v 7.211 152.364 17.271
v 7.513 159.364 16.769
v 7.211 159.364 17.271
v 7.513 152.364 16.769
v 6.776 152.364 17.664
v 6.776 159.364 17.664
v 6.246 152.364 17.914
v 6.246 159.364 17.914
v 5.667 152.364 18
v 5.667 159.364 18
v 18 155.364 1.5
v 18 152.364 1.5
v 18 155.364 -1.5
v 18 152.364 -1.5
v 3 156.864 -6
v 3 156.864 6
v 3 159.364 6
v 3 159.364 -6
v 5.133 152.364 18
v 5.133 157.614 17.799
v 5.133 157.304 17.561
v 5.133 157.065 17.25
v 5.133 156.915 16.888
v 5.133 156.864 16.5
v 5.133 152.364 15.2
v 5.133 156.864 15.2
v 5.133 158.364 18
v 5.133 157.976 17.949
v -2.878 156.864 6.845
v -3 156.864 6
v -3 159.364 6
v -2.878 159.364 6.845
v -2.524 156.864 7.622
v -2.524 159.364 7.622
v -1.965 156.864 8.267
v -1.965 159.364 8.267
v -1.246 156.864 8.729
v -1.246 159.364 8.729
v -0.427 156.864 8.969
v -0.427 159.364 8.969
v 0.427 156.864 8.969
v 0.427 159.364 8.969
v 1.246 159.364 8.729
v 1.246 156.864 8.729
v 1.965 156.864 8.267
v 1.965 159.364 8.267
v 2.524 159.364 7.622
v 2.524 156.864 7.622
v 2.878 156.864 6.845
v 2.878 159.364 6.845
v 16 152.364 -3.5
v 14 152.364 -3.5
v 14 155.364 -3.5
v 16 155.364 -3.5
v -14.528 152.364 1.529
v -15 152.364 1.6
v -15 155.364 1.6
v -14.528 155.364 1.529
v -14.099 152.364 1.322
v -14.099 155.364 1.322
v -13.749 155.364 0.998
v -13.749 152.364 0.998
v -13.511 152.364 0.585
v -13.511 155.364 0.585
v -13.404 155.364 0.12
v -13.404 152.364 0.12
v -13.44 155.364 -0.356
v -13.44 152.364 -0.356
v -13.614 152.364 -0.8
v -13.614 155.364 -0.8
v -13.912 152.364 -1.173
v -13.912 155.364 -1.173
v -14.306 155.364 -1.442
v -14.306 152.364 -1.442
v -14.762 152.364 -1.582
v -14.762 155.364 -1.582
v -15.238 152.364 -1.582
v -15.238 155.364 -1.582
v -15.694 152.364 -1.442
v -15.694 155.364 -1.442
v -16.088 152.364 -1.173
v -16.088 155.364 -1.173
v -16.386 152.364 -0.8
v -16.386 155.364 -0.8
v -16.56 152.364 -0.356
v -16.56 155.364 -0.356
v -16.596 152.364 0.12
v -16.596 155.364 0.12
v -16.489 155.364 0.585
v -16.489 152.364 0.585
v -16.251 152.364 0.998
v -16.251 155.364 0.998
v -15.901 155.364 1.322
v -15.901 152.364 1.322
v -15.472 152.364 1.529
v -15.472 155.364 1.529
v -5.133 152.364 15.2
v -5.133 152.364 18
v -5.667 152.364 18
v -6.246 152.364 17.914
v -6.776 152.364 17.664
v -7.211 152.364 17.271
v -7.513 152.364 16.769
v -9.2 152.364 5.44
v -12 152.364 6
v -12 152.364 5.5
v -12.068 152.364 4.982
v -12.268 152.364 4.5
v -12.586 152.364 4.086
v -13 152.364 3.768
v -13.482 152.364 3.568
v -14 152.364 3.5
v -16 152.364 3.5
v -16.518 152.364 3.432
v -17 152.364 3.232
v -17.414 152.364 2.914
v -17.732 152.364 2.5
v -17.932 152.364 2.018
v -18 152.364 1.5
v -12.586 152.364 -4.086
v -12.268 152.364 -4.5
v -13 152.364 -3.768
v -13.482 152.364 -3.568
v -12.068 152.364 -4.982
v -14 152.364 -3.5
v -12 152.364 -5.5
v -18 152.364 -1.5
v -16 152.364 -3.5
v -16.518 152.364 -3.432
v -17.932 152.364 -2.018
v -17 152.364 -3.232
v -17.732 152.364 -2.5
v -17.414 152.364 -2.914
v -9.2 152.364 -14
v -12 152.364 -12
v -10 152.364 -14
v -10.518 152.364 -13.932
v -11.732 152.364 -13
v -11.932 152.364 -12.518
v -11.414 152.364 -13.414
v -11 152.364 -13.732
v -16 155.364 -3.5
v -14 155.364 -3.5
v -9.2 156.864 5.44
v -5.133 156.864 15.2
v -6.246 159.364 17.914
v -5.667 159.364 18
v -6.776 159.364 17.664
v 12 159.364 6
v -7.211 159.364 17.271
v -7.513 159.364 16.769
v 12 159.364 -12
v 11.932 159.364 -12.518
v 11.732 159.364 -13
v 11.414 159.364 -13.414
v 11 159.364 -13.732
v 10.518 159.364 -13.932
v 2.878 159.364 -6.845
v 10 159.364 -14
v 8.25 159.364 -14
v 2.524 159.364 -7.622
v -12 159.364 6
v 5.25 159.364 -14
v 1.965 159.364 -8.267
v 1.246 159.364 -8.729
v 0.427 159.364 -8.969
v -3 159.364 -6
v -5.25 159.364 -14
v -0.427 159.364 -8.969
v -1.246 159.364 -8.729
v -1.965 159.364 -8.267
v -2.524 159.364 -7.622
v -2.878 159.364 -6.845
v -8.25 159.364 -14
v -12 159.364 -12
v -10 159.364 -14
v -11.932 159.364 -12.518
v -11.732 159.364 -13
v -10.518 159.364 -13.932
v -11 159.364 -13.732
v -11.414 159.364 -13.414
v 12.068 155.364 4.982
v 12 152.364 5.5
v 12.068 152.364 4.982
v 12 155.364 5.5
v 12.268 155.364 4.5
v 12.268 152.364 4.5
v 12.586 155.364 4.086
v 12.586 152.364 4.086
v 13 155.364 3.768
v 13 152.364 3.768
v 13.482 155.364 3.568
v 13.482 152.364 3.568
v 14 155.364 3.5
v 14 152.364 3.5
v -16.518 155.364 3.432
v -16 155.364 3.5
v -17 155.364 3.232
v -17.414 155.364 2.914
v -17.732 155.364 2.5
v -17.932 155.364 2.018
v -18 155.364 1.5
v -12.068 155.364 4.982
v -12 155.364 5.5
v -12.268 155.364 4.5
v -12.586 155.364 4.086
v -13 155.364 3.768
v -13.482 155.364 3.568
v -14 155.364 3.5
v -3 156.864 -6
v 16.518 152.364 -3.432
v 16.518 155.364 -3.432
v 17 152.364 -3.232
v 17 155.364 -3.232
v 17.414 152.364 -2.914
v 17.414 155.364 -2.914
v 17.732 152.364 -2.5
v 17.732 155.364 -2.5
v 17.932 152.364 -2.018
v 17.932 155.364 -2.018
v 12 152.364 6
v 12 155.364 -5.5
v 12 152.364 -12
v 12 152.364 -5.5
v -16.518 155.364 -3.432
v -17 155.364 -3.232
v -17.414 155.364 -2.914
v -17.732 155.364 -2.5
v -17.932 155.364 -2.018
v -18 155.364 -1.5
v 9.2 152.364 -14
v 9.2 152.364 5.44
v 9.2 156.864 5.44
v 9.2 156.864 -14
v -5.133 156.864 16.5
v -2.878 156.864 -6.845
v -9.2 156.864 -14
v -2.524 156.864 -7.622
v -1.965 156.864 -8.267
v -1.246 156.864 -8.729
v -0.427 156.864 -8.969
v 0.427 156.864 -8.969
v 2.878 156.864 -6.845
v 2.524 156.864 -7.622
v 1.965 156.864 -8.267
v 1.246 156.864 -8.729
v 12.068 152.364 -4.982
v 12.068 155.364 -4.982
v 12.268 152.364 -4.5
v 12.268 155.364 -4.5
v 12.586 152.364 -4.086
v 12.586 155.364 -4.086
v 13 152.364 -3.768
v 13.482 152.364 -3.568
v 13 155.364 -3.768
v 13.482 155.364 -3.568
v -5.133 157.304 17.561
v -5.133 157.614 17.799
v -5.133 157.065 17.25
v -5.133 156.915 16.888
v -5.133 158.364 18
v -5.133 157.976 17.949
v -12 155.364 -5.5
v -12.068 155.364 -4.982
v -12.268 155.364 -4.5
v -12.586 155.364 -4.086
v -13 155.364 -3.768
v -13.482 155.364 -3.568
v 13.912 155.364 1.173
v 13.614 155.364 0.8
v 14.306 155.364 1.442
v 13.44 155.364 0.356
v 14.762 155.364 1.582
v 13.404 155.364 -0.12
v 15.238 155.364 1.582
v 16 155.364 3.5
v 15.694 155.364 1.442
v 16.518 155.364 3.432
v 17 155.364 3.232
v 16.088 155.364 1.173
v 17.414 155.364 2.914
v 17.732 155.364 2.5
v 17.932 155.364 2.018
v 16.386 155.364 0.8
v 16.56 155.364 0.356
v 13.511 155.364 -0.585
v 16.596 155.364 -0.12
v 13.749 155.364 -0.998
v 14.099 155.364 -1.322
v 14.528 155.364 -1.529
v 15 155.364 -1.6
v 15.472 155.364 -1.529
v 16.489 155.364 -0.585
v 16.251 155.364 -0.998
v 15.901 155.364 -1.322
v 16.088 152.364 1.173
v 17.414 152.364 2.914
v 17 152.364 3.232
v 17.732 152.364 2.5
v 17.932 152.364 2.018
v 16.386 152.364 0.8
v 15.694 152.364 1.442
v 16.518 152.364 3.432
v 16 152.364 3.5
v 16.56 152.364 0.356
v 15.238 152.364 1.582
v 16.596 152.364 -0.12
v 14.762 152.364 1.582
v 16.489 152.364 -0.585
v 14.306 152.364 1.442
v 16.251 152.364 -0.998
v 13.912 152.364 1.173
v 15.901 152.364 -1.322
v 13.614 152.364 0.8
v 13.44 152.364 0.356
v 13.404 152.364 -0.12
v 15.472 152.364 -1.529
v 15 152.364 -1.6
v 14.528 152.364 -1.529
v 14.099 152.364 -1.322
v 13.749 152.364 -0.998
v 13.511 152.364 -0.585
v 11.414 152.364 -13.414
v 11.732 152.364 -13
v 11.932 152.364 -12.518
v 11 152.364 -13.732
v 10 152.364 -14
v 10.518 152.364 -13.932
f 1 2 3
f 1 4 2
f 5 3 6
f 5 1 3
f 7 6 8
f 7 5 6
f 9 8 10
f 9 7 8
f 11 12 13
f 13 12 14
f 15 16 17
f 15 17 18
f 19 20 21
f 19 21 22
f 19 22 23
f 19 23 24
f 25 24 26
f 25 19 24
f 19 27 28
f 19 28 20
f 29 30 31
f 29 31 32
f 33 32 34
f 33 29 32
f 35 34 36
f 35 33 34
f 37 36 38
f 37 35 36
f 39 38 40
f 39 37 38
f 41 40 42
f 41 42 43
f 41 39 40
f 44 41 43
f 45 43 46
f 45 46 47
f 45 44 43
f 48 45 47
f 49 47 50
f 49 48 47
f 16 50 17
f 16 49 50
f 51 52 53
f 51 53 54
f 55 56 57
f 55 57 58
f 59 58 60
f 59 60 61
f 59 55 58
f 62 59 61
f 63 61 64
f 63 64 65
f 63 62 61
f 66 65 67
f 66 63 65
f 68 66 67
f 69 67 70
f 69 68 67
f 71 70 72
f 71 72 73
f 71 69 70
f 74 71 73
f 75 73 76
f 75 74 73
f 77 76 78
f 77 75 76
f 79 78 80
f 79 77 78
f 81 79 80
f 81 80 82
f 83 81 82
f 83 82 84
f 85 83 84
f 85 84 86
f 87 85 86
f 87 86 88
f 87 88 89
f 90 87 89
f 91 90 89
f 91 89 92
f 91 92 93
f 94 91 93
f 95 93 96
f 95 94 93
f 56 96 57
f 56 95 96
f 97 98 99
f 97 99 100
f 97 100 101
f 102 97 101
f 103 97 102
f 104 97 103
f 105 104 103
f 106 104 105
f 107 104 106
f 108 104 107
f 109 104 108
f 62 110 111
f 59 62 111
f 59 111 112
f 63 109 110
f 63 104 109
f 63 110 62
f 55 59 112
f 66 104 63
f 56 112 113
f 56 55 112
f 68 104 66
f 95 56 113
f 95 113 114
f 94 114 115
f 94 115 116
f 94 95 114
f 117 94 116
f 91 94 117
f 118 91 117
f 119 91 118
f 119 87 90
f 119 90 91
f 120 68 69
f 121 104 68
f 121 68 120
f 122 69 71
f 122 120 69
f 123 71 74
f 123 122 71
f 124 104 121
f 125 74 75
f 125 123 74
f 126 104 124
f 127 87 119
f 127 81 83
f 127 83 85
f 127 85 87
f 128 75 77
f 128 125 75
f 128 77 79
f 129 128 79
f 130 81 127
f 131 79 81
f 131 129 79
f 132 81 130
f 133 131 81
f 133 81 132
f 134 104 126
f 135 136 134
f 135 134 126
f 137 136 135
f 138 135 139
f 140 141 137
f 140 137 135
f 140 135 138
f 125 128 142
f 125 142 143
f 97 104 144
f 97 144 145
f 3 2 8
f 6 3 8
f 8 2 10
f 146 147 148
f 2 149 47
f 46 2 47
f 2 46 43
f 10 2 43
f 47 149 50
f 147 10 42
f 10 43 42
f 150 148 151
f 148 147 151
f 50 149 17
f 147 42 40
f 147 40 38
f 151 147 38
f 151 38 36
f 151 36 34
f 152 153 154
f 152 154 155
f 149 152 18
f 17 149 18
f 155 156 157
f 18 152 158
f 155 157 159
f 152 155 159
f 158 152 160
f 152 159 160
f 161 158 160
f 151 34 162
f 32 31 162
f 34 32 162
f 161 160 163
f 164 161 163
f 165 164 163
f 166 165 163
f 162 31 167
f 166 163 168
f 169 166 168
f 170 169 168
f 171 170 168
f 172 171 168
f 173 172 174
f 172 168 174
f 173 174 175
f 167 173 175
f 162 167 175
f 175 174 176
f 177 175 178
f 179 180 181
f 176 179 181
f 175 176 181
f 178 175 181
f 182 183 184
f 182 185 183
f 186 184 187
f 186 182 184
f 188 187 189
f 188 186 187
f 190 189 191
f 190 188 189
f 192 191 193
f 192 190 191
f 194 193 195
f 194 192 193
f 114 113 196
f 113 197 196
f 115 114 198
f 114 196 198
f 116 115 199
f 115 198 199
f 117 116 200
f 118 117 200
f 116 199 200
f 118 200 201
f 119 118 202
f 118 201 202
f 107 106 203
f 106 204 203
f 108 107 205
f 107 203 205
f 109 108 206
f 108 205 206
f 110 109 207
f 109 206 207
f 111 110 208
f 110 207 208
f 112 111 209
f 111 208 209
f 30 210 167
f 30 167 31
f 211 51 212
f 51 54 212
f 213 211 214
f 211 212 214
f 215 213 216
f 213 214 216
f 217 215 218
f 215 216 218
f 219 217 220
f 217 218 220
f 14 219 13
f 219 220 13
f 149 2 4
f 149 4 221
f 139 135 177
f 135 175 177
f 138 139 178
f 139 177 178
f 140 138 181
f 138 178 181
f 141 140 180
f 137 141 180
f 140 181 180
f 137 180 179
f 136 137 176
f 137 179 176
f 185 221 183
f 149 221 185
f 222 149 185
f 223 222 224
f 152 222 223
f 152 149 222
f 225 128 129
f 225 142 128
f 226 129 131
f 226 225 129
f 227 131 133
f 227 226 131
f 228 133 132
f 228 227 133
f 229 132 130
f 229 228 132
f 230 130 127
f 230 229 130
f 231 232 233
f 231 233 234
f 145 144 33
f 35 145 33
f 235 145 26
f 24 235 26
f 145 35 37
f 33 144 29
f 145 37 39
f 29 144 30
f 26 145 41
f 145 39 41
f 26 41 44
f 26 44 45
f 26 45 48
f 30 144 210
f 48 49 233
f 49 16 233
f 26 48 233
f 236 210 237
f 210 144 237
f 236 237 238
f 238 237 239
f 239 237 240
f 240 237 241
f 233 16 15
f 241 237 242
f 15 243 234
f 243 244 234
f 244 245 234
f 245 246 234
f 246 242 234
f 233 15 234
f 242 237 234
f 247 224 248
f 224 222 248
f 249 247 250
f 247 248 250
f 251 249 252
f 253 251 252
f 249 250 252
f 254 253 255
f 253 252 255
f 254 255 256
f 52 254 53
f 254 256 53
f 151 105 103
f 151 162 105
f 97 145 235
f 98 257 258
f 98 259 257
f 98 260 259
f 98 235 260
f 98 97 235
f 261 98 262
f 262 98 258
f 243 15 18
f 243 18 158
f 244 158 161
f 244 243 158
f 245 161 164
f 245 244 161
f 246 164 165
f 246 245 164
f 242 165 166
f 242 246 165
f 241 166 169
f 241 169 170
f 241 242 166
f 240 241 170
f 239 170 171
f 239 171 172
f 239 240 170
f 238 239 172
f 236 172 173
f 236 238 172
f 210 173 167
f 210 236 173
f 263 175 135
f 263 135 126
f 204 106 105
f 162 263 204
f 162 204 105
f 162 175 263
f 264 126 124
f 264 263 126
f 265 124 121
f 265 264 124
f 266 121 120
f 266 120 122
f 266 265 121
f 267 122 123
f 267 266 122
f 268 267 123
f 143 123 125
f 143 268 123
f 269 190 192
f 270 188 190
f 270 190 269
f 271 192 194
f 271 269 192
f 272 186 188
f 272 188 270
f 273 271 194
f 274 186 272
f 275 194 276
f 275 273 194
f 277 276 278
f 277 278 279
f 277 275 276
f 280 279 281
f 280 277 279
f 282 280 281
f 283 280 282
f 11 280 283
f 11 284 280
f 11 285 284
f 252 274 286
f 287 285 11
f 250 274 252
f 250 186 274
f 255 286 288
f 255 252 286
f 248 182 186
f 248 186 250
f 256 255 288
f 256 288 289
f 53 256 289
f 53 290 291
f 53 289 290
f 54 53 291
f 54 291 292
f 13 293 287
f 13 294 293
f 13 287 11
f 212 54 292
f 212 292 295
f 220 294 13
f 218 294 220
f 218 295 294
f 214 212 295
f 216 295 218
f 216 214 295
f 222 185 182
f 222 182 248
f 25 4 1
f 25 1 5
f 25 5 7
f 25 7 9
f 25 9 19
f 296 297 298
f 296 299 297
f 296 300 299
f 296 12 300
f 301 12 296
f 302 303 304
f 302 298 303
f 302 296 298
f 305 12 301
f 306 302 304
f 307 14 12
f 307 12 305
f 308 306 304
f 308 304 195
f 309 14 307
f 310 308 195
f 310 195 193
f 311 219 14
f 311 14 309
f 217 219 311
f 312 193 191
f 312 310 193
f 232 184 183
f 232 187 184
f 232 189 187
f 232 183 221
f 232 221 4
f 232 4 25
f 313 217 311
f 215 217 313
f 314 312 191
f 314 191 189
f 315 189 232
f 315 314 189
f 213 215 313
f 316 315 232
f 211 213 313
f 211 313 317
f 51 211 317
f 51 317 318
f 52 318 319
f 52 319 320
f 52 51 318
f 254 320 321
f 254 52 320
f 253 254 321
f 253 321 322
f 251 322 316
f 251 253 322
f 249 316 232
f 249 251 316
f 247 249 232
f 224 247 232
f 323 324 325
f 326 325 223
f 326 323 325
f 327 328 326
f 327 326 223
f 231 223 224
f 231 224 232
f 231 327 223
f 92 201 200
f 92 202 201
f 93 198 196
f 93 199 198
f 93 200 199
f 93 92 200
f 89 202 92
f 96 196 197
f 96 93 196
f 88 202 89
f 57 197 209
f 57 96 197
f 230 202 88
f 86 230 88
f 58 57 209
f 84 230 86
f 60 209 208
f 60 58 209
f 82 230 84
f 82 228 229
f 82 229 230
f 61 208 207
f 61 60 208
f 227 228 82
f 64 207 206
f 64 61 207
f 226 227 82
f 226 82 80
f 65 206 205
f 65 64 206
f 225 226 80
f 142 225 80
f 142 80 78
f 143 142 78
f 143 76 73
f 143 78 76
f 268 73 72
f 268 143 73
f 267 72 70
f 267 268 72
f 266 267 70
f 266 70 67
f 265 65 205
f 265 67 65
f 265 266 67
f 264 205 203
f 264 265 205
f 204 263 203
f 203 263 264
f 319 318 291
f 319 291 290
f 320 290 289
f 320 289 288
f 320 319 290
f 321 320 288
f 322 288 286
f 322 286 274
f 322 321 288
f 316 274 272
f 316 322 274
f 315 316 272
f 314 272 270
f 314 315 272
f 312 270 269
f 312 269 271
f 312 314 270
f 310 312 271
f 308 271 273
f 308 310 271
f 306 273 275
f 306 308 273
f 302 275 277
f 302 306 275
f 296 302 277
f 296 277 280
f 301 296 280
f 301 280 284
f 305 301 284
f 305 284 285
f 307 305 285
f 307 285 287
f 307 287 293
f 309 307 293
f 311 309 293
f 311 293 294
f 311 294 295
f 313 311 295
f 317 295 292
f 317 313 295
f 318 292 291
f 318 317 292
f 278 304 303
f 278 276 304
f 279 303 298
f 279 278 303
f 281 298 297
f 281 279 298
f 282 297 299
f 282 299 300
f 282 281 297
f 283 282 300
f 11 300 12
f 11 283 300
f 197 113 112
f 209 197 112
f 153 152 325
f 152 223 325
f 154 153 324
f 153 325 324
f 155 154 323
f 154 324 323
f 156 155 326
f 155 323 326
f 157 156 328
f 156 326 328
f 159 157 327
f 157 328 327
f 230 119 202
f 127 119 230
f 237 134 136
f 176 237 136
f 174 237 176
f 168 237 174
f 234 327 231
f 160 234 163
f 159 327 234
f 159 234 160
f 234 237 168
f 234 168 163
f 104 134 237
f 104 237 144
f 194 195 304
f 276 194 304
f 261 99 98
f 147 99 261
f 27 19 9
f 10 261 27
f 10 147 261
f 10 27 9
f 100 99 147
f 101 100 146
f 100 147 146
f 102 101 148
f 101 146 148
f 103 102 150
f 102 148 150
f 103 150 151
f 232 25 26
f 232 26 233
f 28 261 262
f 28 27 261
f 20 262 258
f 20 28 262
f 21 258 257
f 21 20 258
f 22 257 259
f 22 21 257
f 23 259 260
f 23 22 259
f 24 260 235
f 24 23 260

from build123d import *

# Parameters (mm, degrees)
EXTRUDE_1_DEPTH      = 3
SKETCH_7_R           = 1.75
SKETCH_7_R_2         = 2.25
CUT_EXTRUDE_2_DEPTH  = 143.955430949
CUT_EXTRUDE_4_DEPTH  = 3
CUT_EXTRUDE_5_DEPTH  = 3
CUT_EXTRUDE_8_DEPTH  = 3
SKETCH_12_R          = 1.7
CUT_EXTRUDE_9_DEPTH  = 3
SKETCH_13_R          = 1.7
CUT_EXTRUDE_11_DEPTH = 3
CUT_EXTRUDE_12_DEPTH = 143.955430949
FILLET_1_R           = 2
FILLET_2_R           = 2
CUT_EXTRUDE_13_DEPTH = 143.955430949
CUT_EXTRUDE_15_DEPTH = 143.955430949
CUT_EXTRUDE_16_DEPTH = 143.955430949
SKETCH_20_W          = 133.80338819
SKETCH_20_H          = 42.989432067
EXTRUDE_2_DEPTH      = 3
SKETCH_21_W          = 129.207272524
SKETCH_21_H          = 38.788932745
EXTRUDE_3_DEPTH      = 3
SKETCH_22_W          = 20.868569364
SKETCH_22_H          = 31.210515244
SKETCH_22_W_2        = 21.053246969
SKETCH_22_H_2        = 30.102449614
EXTRUDE_4_DEPTH      = 3
SKETCH_24_W          = 36.300662223
SKETCH_24_H          = 5.953308604
SKETCH_24_W_2        = 36.591067521
EXTRUDE_5_DEPTH      = 3
CUT_EXTRUDE_17_DEPTH = 143.955430949
CUT_EXTRUDE_19_DEPTH = 143.955430949
CUT_EXTRUDE_20_DEPTH = 143.955430949
CUT_EXTRUDE_21_DEPTH = 143.955430949
CUT_EXTRUDE_22_DEPTH = 143.955430949
CUT_EXTRUDE_23_DEPTH = 3
SKETCH_30_R          = 1.7
SKETCH_30_R_2        = 3.5
EXTRUDE_6_DEPTH      = 4
EXTRUDE_7_DEPTH      = 24
CUT_EXTRUDE_26_DEPTH = 31.5
EXTRUDE_8_DEPTH      = 10
EXTRUDE_9_DEPTH      = 1
CUT_EXTRUDE_27_DEPTH = 10
SKETCH_38_W          = 3
SKETCH_38_H          = 1
CUT_EXTRUDE_28_DEPTH = 166.273761152
CUT_EXTRUDE_29_DEPTH = 21
EXTRUDE_11_DEPTH     = 7
CUT_EXTRUDE_30_DEPTH = 5.5
EXTRUDE_12_DEPTH     = 3
CUT_EXTRUDE_31_DEPTH = 23
FILLET_4_R           = 0.7
FILLET_5_R           = 1
FILLET_6_R           = 1.2
CUT_EXTRUDE_32_DEPTH = 3
SKETCH_47_W          = 24
SKETCH_47_H          = 1
CUT_EXTRUDE_33_DEPTH = 167.672697425
SKETCH_48_W          = 6
SKETCH_48_H          = 7
SKETCH_48_R          = 1.6
EXTRUDE_13_DEPTH     = 3
FILLET_7_R           = 2
SKETCH_49_W          = 40.518885993
SKETCH_49_H          = 45.885701136
CUT_EXTRUDE_34_DEPTH = 33
FILLET_8_R           = 2
FILLET_9_R           = 2
FILLET_10_R          = 2
FILLET_11_R          = 2
FILLET_12_R          = 1.5
FILLET_13_R          = 1.5
SKETCH_51_W          = 46.608599542
SKETCH_51_H          = 55.034000229
CUT_EXTRUDE_36_DEPTH = 40


# Read off the part's stored shape, not the designer's step: 切除-拉伸35
with BuildPart() as part:
    # 草图1 → 凸台-拉伸1 (new body)
    # profile 1 of 14: a face of its own
    with BuildSketch(Plane.XY):
        with BuildLine():
            Line((60, 106.603296002), (35.889163634, 121.664519159))
            Line((35.889163634, 121.664519159), (-35.889163634, 121.664519159))
            Line((-35.889163634, 121.664519159), (-60, 106.603296002))
            Line((-60, 106.603296002), (-60, 94.801892265))
            Line((-60, 94.801892265), (-45, 94.801892265))
            ThreePointArc((-45, 94.801892265), (-43.762563133, 94.289329132), (-43.25, 93.051892265))
            Line((-43.25, 93.051892265), (-37.75, 93.051892265))
            ThreePointArc((-37.75, 93.051892265), (-37.237436867, 94.289329132), (-36, 94.801892265))
            Line((-36, 94.801892265), (-21, 94.801892265))
            ThreePointArc((-21, 94.801892265), (-19.762563133, 94.289329132), (-19.25, 93.051892265))
            Line((-19.25, 93.051892265), (19.25, 93.051892265))
            ThreePointArc((19.25, 93.051892265), (19.762563133, 94.289329132), (21, 94.801892265))
            Line((21, 94.801892265), (36, 94.801892265))
            ThreePointArc((36, 94.801892265), (37.237436867, 94.289329132), (37.75, 93.051892265))
            Line((37.75, 93.051892265), (43.25, 93.051892265))
            ThreePointArc((43.25, 93.051892265), (43.762563133, 94.289329132), (45, 94.801892265))
            Line((45, 94.801892265), (60, 94.801892265))
            Line((60, 94.801892265), (60, 106.603296002))
        make_face()
    # profile 2 of 14: a face of its own
    with BuildSketch(Plane.XY):
        with BuildLine():
            Line((66.901694095, 102.292041372), (60, 106.603296002))
            Line((60, 106.603296002), (60, 94.801892265))
            ThreePointArc((60, 94.801892265), (61.237436867, 94.289329132), (61.75, 93.051892265))
            Line((61.75, 93.051892265), (66.901694095, 93.051892265))
            Line((66.901694095, 93.051892265), (66.901694095, 102.292041372))
        make_face()
    # profile 3 of 14: a face of its own
    with BuildSketch(Plane.XY):
        with BuildLine():
            Line((-60, 94.801892265), (-60, 106.603296002))
            Line((-60, 106.603296002), (-66.901694095, 102.292041372))
            Line((-66.901694095, 102.292041372), (-66.901694095, 93.051892265))
            Line((-66.901694095, 93.051892265), (-61.75, 93.051892265))
            ThreePointArc((-61.75, 93.051892265), (-61.237436867, 94.289329132), (-60, 94.801892265))
        make_face()
    # profile 4 of 14: a face of its own
    with BuildSketch(Plane.XY):
        with BuildLine():
            Line((66.901694095, 63.051892265), (66.901694095, 93.051892265))
            Line((66.901694095, 93.051892265), (61.75, 93.051892265))
            ThreePointArc((61.75, 93.051892265), (61.237436867, 91.814455398), (60, 91.301892265))
            Line((60, 91.301892265), (60, 64.801892265))
            ThreePointArc((60, 64.801892265), (61.237436867, 64.289329132), (61.75, 63.051892265))
            Line((61.75, 63.051892265), (66.901694095, 63.051892265))
        make_face()
    # profile 5 of 14: a face of its own
    with BuildSketch(Plane.XY):
        with BuildLine():
            Line((-61.75, 93.051892265), (-66.901694095, 93.051892265))
            Line((-66.901694095, 93.051892265), (-66.901694095, 63.051892265))
            Line((-66.901694095, 63.051892265), (-61.75, 63.051892265))
            ThreePointArc((-61.75, 63.051892265), (-61.237436867, 64.289329132), (-60, 64.801892265))
            Line((-60, 64.801892265), (-60, 91.301892265))
            ThreePointArc((-60, 91.301892265), (-61.237436867, 91.814455398), (-61.75, 93.051892265))
        make_face()
    # profile 6 of 14: a face of its own
    with BuildSketch(Plane.XY):
        with BuildLine():
            Line((66.901694095, 52.870133869), (66.901694095, 63.051892265))
            Line((66.901694095, 63.051892265), (61.75, 63.051892265))
            ThreePointArc((61.75, 63.051892265), (61.237436867, 61.814455398), (60, 61.301892265))
            Line((60, 61.301892265), (60, 31.261343001))
            Line((60, 31.261343001), (75, 31.261343001))
            Line((75, 31.261343001), (75, 40.933889795))
            ThreePointArc((75, 40.933889795), (69.117351927, 45.658052319), (66.901694095, 52.870133869))
        make_face()
    # profile 7 of 14: a face of its own
    with BuildSketch(Plane.XY):
        with BuildLine():
            Line((60, 64.801892265), (60, 91.301892265))
            Line((60, 91.301892265), (45, 91.301892265))
            ThreePointArc((45, 91.301892265), (43.762563133, 91.814455398), (43.25, 93.051892265))
            Line((43.25, 93.051892265), (37.75, 93.051892265))
            ThreePointArc((37.75, 93.051892265), (37.237436867, 91.814455398), (36, 91.301892265))
            Line((36, 91.301892265), (21, 91.301892265))
            ThreePointArc((21, 91.301892265), (19.762563133, 91.814455398), (19.25, 93.051892265))
            Line((19.25, 93.051892265), (-19.25, 93.051892265))
            ThreePointArc((-19.25, 93.051892265), (-19.762563133, 91.814455398), (-21, 91.301892265))
            Line((-21, 91.301892265), (-36, 91.301892265))
            ThreePointArc((-36, 91.301892265), (-37.237436867, 91.814455398), (-37.75, 93.051892265))
            Line((-37.75, 93.051892265), (-43.25, 93.051892265))
            ThreePointArc((-43.25, 93.051892265), (-43.762563133, 91.814455398), (-45, 91.301892265))
            Line((-45, 91.301892265), (-60, 91.301892265))
            Line((-60, 91.301892265), (-60, 64.801892265))
            Line((-60, 64.801892265), (-45, 64.801892265))
            ThreePointArc((-45, 64.801892265), (-43.762563133, 64.289329132), (-43.25, 63.051892265))
            Line((-43.25, 63.051892265), (-37.75, 63.051892265))
            ThreePointArc((-37.75, 63.051892265), (-37.237436867, 64.289329132), (-36, 64.801892265))
            Line((-36, 64.801892265), (-21, 64.801892265))
            ThreePointArc((-21, 64.801892265), (-19.762563133, 64.289329132), (-19.25, 63.051892265))
            Line((-19.25, 63.051892265), (19.25, 63.051892265))
            ThreePointArc((19.25, 63.051892265), (19.762563133, 64.289329132), (21, 64.801892265))
            Line((21, 64.801892265), (36, 64.801892265))
            ThreePointArc((36, 64.801892265), (37.237436867, 64.289329132), (37.75, 63.051892265))
            Line((37.75, 63.051892265), (43.25, 63.051892265))
            ThreePointArc((43.25, 63.051892265), (43.762563133, 64.289329132), (45, 64.801892265))
            Line((45, 64.801892265), (60, 64.801892265))
        make_face()
    # profile 8 of 14: a face of its own
    with BuildSketch(Plane.XY):
        with BuildLine():
            Line((-61.75, 63.051892265), (-66.901694095, 63.051892265))
            Line((-66.901694095, 63.051892265), (-66.901694095, 52.870133869))
            ThreePointArc((-66.901694095, 52.870133869), (-69.117351927, 45.658052319), (-75, 40.933889795))
            Line((-75, 40.933889795), (-75, 31.261343001))
            Line((-75, 31.261343001), (-60, 31.261343001))
            Line((-60, 31.261343001), (-60, 61.301892265))
            ThreePointArc((-60, 61.301892265), (-61.237436867, 61.814455398), (-61.75, 63.051892265))
        make_face()
    # profile 9 of 14: a face of its own
    with BuildSketch(Plane.XY):
        with BuildLine():
            Line((60, 31.261343001), (60, 61.301892265))
            Line((60, 61.301892265), (45, 61.301892265))
            ThreePointArc((45, 61.301892265), (43.762563133, 61.814455398), (43.25, 63.051892265))
            Line((43.25, 63.051892265), (37.75, 63.051892265))
            ThreePointArc((37.75, 63.051892265), (37.237436867, 61.814455398), (36, 61.301892265))
            Line((36, 61.301892265), (21, 61.301892265))
            ThreePointArc((21, 61.301892265), (19.762563133, 61.814455398), (19.25, 63.051892265))
            Line((19.25, 63.051892265), (-19.25, 63.051892265))
            ThreePointArc((-19.25, 63.051892265), (-19.762563133, 61.814455398), (-21, 61.301892265))
            Line((-21, 61.301892265), (-36, 61.301892265))
            ThreePointArc((-36, 61.301892265), (-37.237436867, 61.814455398), (-37.75, 63.051892265))
            Line((-37.75, 63.051892265), (-43.25, 63.051892265))
            ThreePointArc((-43.25, 63.051892265), (-43.762563133, 61.814455398), (-45, 61.301892265))
            Line((-45, 61.301892265), (-60, 61.301892265))
            Line((-60, 61.301892265), (-60, 31.261343001))
            Line((-60, 31.261343001), (60, 31.261343001))
        make_face()
    # profile 10 of 14: a face of its own
    with BuildSketch(Plane.XY):
        with BuildLine():
            Line((60, -58.312864289), (60, 23.940028391))
            Line((60, 23.940028391), (-60, 23.940028391))
            Line((-60, 23.940028391), (-60, -58.312864289))
            Line((-60, -58.312864289), (-45, -58.312864289))
            ThreePointArc((-45, -58.312864289), (-43.25, -60.062864289), (-45, -61.812864289))
            Line((-45, -61.812864289), (-60, -61.812864289))
            Line((-60, -61.812864289), (-60, -88.312864289))
            Line((-60, -88.312864289), (-45, -88.312864289))
            ThreePointArc((-45, -88.312864289), (-43.25, -90.062864289), (-45, -91.812864289))
            Line((-45, -91.812864289), (-60, -91.812864289))
            Line((-60, -91.812864289), (-60, -111.849967256))
            Line((-60, -111.849967256), (-38.845469114, -105.590576733))
            ThreePointArc((-38.845469114, -105.590576733), (-36.037784492, -104.975210108), (-33.17088573, -104.768665882))
            Line((-33.17088573, -104.768665882), (33.17088573, -104.768665882))
            ThreePointArc((33.17088573, -104.768665882), (36.037784492, -104.975210108), (38.845469114, -105.590576733))
            Line((38.845469114, -105.590576733), (60, -111.849967256))
            Line((60, -111.849967256), (60, -91.812864289))
            Line((60, -91.812864289), (45, -91.812864289))
            ThreePointArc((45, -91.812864289), (43.762563133, -91.300301156), (43.25, -90.062864289))
            ThreePointArc((43.25, -90.062864289), (43.762563133, -88.825427422), (45, -88.312864289))
            Line((45, -88.312864289), (60, -88.312864289))
            Line((60, -88.312864289), (60, -61.812864289))
            Line((60, -61.812864289), (45, -61.812864289))
            ThreePointArc((45, -61.812864289), (43.762563133, -61.300301156), (43.25, -60.062864289))
            ThreePointArc((43.25, -60.062864289), (43.762563133, -58.825427422), (45, -58.312864289))
            Line((45, -58.312864289), (60, -58.312864289))
        make_face()
        with BuildLine():
            ThreePointArc((-21, -88.312864289), (-19.762563133, -88.825427422), (-19.25, -90.062864289))
            ThreePointArc((-19.25, -90.062864289), (-19.762563133, -91.300301156), (-21, -91.812864289))
            Line((-21, -91.812864289), (-36, -91.812864289))
            ThreePointArc((-36, -91.812864289), (-37.75, -90.062864289), (-36, -88.312864289))
            Line((-36, -88.312864289), (-21, -88.312864289))
        make_face(mode=Mode.SUBTRACT)
        with BuildLine():
            ThreePointArc((-21, -58.312864289), (-19.762563133, -58.825427422), (-19.25, -60.062864289))
            ThreePointArc((-19.25, -60.062864289), (-19.762563133, -61.300301156), (-21, -61.812864289))
            Line((-21, -61.812864289), (-36, -61.812864289))
            ThreePointArc((-36, -61.812864289), (-37.75, -60.062864289), (-36, -58.312864289))
            Line((-36, -58.312864289), (-21, -58.312864289))
        make_face(mode=Mode.SUBTRACT)
        with BuildLine():
            ThreePointArc((36, -88.312864289), (37.237436867, -88.825427422), (37.75, -90.062864289))
            ThreePointArc((37.75, -90.062864289), (37.237436867, -91.300301156), (36, -91.812864289))
            Line((36, -91.812864289), (21, -91.812864289))
            ThreePointArc((21, -91.812864289), (19.762563133, -91.300301156), (19.25, -90.062864289))
            ThreePointArc((19.25, -90.062864289), (19.762563133, -88.825427422), (21, -88.312864289))
            Line((21, -88.312864289), (36, -88.312864289))
        make_face(mode=Mode.SUBTRACT)
        with BuildLine():
            ThreePointArc((36, -58.312864289), (37.237436867, -58.825427422), (37.75, -60.062864289))
            ThreePointArc((37.75, -60.062864289), (37.237436867, -61.300301156), (36, -61.812864289))
            Line((36, -61.812864289), (21, -61.812864289))
            ThreePointArc((21, -61.812864289), (19.762563133, -61.300301156), (19.25, -60.062864289))
            ThreePointArc((19.25, -60.062864289), (19.762563133, -58.825427422), (21, -58.312864289))
            Line((21, -58.312864289), (36, -58.312864289))
        make_face(mode=Mode.SUBTRACT)
    # profile 11 of 14: a face of its own
    with BuildSketch(Plane.XY):
        with BuildLine():
            Line((75, 23.940028391), (60, 23.940028391))
            Line((60, 23.940028391), (60, -58.312864289))
            ThreePointArc((60, -58.312864289), (61.237436867, -58.825427422), (61.75, -60.062864289))
            Line((61.75, -60.062864289), (67.402721334, -60.062864289))
            add(Edge.make_bspline(
                [(75, 10.562559835), (72.695878257, 1.907314233), (70.339582535, -13.372796253), (67.818206704, -36.939032951), (67.208860388, -51.77269444), (67.402721334, -60.062864289)],
                knots=[0, 0, 0, 0, 0.235246678, 0.40629419, 0.624108181, 0.624108181, 0.624108181, 0.624108181], degree=3))
            Line((75, 10.562559835), (75, 23.940028391))
        make_face()
    # profile 12 of 14: a face of its own
    with BuildSketch(Plane.XY):
        with BuildLine():
            Line((-60, -58.312864289), (-60, 23.940028391))
            Line((-60, 23.940028391), (-75, 23.940028391))
            Line((-75, 23.940028391), (-75, 10.562559835))
            add(Edge.make_bspline(
                [(-75, 10.562559835), (-72.695878257, 1.907314233), (-70.339582535, -13.372796253), (-67.818206704, -36.939032951), (-67.208860388, -51.77269444), (-67.402721334, -60.062864289)],
                knots=[0, 0, 0, 0, 0.235246678, 0.40629419, 0.624108181, 0.624108181, 0.624108181, 0.624108181], degree=3))
            add(Edge.make_bspline(
                [(-67.402721334, -60.062864289), (-67.560325872, -66.802583754), (-68.323504015, -76.843670093), (-70.154131955, -86.778530076), (-70.533712858, -90.062864289)],
                knots=[0.624108181, 0.624108181, 0.624108181, 0.624108181, 0.801186001, 0.888408652, 0.888408652, 0.888408652, 0.888408652], degree=3))
            add(Edge.make_bspline(
                [(-70.533712858, -90.062864289), (-71.019342956, -94.264792095), (-71.137422935, -98.476048206), (-70.1742624, -102.732794059)],
                knots=[0.888408652, 0.888408652, 0.888408652, 0.888408652, 1, 1, 1, 1], degree=3))
            Line((-70.1742624, -102.732794059), (-66.460817635, -113.761651372))
            Line((-66.460817635, -113.761651372), (-60, -111.849967256))
            Line((-60, -111.849967256), (-60, -91.812864289))
            ThreePointArc((-60, -91.812864289), (-61.75, -90.062864289), (-60, -88.312864289))
            Line((-60, -88.312864289), (-60, -61.812864289))
            ThreePointArc((-60, -61.812864289), (-61.75, -60.062864289), (-60, -58.312864289))
        make_face()
    # profile 13 of 14: a face of its own
    with BuildSketch(Plane.XY):
        with BuildLine():
            Line((67.402721334, -60.062864289), (61.75, -60.062864289))
            ThreePointArc((61.75, -60.062864289), (61.237436867, -61.300301156), (60, -61.812864289))
            Line((60, -61.812864289), (60, -88.312864289))
            ThreePointArc((60, -88.312864289), (61.237436867, -88.825427422), (61.75, -90.062864289))
            Line((61.75, -90.062864289), (70.533712858, -90.062864289))
            add(Edge.make_bspline(
                [(67.402721334, -60.062864289), (67.560325872, -66.802583754), (68.323504015, -76.843670093), (70.154131955, -86.778530076), (70.533712858, -90.062864289)],
                knots=[0.624108181, 0.624108181, 0.624108181, 0.624108181, 0.801186001, 0.888408652, 0.888408652, 0.888408652, 0.888408652], degree=3))
        make_face()
    # profile 14 of 14: a face of its own
    with BuildSketch(Plane.XY):
        with BuildLine():
            add(Edge.make_bspline(
                [(70.533712858, -90.062864289), (71.019342956, -94.264792095), (71.137422935, -98.476048206), (70.1742624, -102.732794059)],
                knots=[0.888408652, 0.888408652, 0.888408652, 0.888408652, 1, 1, 1, 1], degree=3))
            Line((70.533712858, -90.062864289), (61.75, -90.062864289))
            ThreePointArc((61.75, -90.062864289), (61.237436867, -91.300301156), (60, -91.812864289))
            Line((60, -91.812864289), (60, -111.849967256))
            Line((60, -111.849967256), (66.460817635, -113.761651372))
            Line((66.460817635, -113.761651372), (70.1742624, -102.732794059))
        make_face()
    extrude(amount=EXTRUDE_1_DEPTH)

    # 草图7 → 切除-拉伸2 (cut, through all)
    with BuildSketch(Plane(origin=(0, 0, 0), x_dir=(-1, 0, 0), z_dir=(0, 0, -1))):
        with Locations((-21, 41.261343001)):
            Circle(SKETCH_7_R)
        with Locations((21, 41.261343001)):
            Circle(SKETCH_7_R)
        with Locations((-21, 13.940028391)):
            Circle(SKETCH_7_R_2)
        with Locations((21, 13.940028391)):
            Circle(SKETCH_7_R_2)
    extrude(amount=-CUT_EXTRUDE_2_DEPTH, mode=Mode.SUBTRACT)

    # 草图9 → 切除-拉伸4 (cut)
    with BuildSketch(Plane.XY.offset(3)):
        with BuildLine():
            Line((55, -100.49704609), (20, -100.49704609))
            ThreePointArc((20, -100.49704609), (18.25, -98.74704609), (20, -96.99704609))
            Line((20, -96.99704609), (55, -96.99704609))
            ThreePointArc((55, -96.99704609), (56.75, -98.74704609), (55, -100.49704609))
        make_face()
        with BuildLine():
            Line((-55, -96.99704609), (-20, -96.99704609))
            ThreePointArc((-20, -96.99704609), (-18.25, -98.74704609), (-20, -100.49704609))
            Line((-20, -100.49704609), (-55, -100.49704609))
            ThreePointArc((-55, -100.49704609), (-56.75, -98.74704609), (-55, -96.99704609))
        make_face()
    extrude(amount=-CUT_EXTRUDE_4_DEPTH, mode=Mode.SUBTRACT)

    # 草图10 → 切除-拉伸5 (cut)
    with BuildSketch(Plane.XY.offset(3)):
        with BuildLine():
            Line((12.5, -80.062864289), (-12.5, -80.062864289))
            ThreePointArc((-12.5, -80.062864289), (-17.5, -75.062864289), (-12.5, -70.062864289))
            Line((-12.5, -70.062864289), (12.5, -70.062864289))
            ThreePointArc((12.5, -70.062864289), (17.5, -75.062864289), (12.5, -80.062864289))
        make_face()
    extrude(amount=-CUT_EXTRUDE_5_DEPTH, mode=Mode.SUBTRACT)

    # 草图11 → 切除-拉伸8 (cut)
    with BuildSketch(Plane.XY.offset(3)):
        with BuildLine():
            Line((15, 73.051892265), (-15, 73.051892265))
            ThreePointArc((-15, 73.051892265), (-20, 78.051892265), (-15, 83.051892265))
            Line((-15, 83.051892265), (15, 83.051892265))
            ThreePointArc((15, 83.051892265), (20, 78.051892265), (15, 73.051892265))
        make_face()
    extrude(amount=-CUT_EXTRUDE_8_DEPTH, mode=Mode.SUBTRACT)

    # 草图12 → 切除-拉伸9 (cut)
    with BuildSketch(Plane.XY.offset(3)):
        with Locations((0, 114.371786435)):
            Circle(SKETCH_12_R)
        with Locations((0, 98.371786435)):
            Circle(SKETCH_12_R)
        with Locations((8, 106.371786435)):
            Circle(SKETCH_12_R)
        with Locations((-8, 106.371786435)):
            Circle(SKETCH_12_R)
    extrude(amount=-CUT_EXTRUDE_9_DEPTH, mode=Mode.SUBTRACT)

    # 草图13 → 切除-拉伸11 (cut)
    with BuildSketch(Plane.XY.offset(3)):
        with Locations((0, -84.415765086)):
            Circle(SKETCH_13_R)
        with Locations((8, -92.415765086)):
            Circle(SKETCH_13_R)
        with Locations((0, -100.415765086)):
            Circle(SKETCH_13_R)
        with Locations((-8, -92.415765086)):
            Circle(SKETCH_13_R)
    extrude(amount=-CUT_EXTRUDE_11_DEPTH, mode=Mode.SUBTRACT)

    # 草图14 → 切除-拉伸12 (cut, through all)
    with BuildSketch(Plane.XY.offset(3)):
        with BuildLine():
            Line((-55.475501567, 8.919687236), (-55.475501567, -46.080312764))
            ThreePointArc((-55.475501567, -46.080312764), (-57.225501567, -47.830312764), (-58.975501567, -46.080312764))
            Line((-58.975501567, -46.080312764), (-58.975501567, 8.919687236))
            ThreePointArc((-58.975501567, 8.919687236), (-57.225501567, 10.669687236), (-55.475501567, 8.919687236))
        make_face()
        with BuildLine():
            Line((58.975501567, 8.919687236), (58.975501567, -46.080312764))
            ThreePointArc((58.975501567, -46.080312764), (57.225501567, -47.830312764), (55.475501567, -46.080312764))
            Line((55.475501567, -46.080312764), (55.475501567, 8.919687236))
            ThreePointArc((55.475501567, 8.919687236), (57.225501567, 10.669687236), (58.975501567, 8.919687236))
        make_face()
    extrude(amount=-CUT_EXTRUDE_12_DEPTH, mode=Mode.SUBTRACT)

    # 圆角1
    fillet_1_edges = [part.edges().sort_by_distance(p)[0] for p in [
        (75, 31.261343001, 1.5),
        (-75, 31.261343001, 1.5),
    ]]
    fillet(fillet_1_edges, radius=FILLET_1_R)

    # 圆角2
    fillet_2_edges = [part.edges().sort_by_distance(p)[0] for p in [
        (-75, 23.940028391, 1.5),
        (75, 23.940028391, 1.5),
    ]]
    fillet(fillet_2_edges, radius=FILLET_2_R)

    # 草图15 → 切除-拉伸13 (cut, through all)
    with BuildSketch(Plane(origin=(0, 0, 0), x_dir=(-1, 0, 0), z_dir=(0, 0, -1))):
        with BuildLine():
            Line((-61.184216401, 102.403501276), (-34.774762862, 118.900592756))
            ThreePointArc((-34.774762862, 118.900592756), (-32.70788159, 118.423097411), (-33.185376934, 116.356216138))
            Line((-33.185376934, 116.356216138), (-59.594830473, 99.859124658))
            ThreePointArc((-59.594830473, 99.859124658), (-61.661711746, 100.336620003), (-61.184216401, 102.403501276))
        make_face()
        with BuildLine():
            Line((59.594830473, 99.859124658), (33.185376934, 116.356216138))
            ThreePointArc((33.185376934, 116.356216138), (32.70788159, 118.423097411), (34.774762862, 118.900592756))
            Line((34.774762862, 118.900592756), (61.184216401, 102.403501276))
            ThreePointArc((61.184216401, 102.403501276), (61.661711746, 100.336620003), (59.594830473, 99.859124658))
        make_face()
    extrude(amount=-CUT_EXTRUDE_13_DEPTH, mode=Mode.SUBTRACT)

    # 草图17 → 切除-拉伸15 (cut, through all)
    with BuildSketch(Plane(origin=(0, 0, 0), x_dir=(-1, 0, 0), z_dir=(0, 0, -1))):
        Polygon((-28.645414283, -8.118433382), (-34.644957411, -20.11751964), (-34.644957411, -29.946558382), (-37.580904049, -29.946558382), (-37.580904049, -20.11751964), (-43.580447177, -8.118433382), (-40.64450054, -8.118433382), (-36.176755657, -17.43687271), (-36.049105803, -17.43687271), (-31.58136092, -8.118433382), align=None)
    extrude(amount=-CUT_EXTRUDE_15_DEPTH, mode=Mode.SUBTRACT)

    # 草图18 → 切除-拉伸16 (cut, through all)
    with BuildSketch(Plane(origin=(0, 0, 0), x_dir=(-1, 0, 0), z_dir=(0, 0, -1))):
        Polygon((46.06697123, -29.087529791), (43.131024593, -29.087529791), (43.131024593, -18.875541487), (35.854982926, -18.875541487), (35.854982926, -29.087529791), (32.919036289, -29.087529791), (32.919036289, -7.259404791), (35.854982926, -7.259404791), (35.854982926, -16.450194265), (43.131024593, -16.450194265), (43.131024593, -7.259404791), (46.06697123, -7.259404791), align=None)
    extrude(amount=-CUT_EXTRUDE_16_DEPTH, mode=Mode.SUBTRACT)

    # 草图20 → 凸台-拉伸2 (add)
    with BuildSketch(Plane(origin=(0, 0, 0), x_dir=(-1, 0, 0), z_dir=(0, 0, -1))):
        with Locations((0, 74.364849902)):
            Rectangle(SKETCH_20_W, SKETCH_20_H)
    extrude(amount=-EXTRUDE_2_DEPTH)

    # 草图21 → 凸台-拉伸3 (add)
    with BuildSketch(Plane(origin=(0, 0, 0), x_dir=(-1, 0, 0), z_dir=(0, 0, -1))):
        with Locations((-0.162688936, -75.817262983)):
            Rectangle(SKETCH_21_W, SKETCH_21_H)
    extrude(amount=-EXTRUDE_3_DEPTH)

    # 草图22 → 凸台-拉伸4 (add)
    with BuildSketch(Plane(origin=(0, 0, 0), x_dir=(-1, 0, 0), z_dir=(0, 0, -1))):
        with Locations((-36.28455521, -18.718035035)):
            Rectangle(SKETCH_22_W, SKETCH_22_H)
        with Locations((39.340924035, -18.16400222)):
            Rectangle(SKETCH_22_W_2, SKETCH_22_H_2)
    extrude(amount=-EXTRUDE_4_DEPTH)

    # 草图24 → 凸台-拉伸5 (add)
    with BuildSketch(Plane(origin=(0, 0, 0), x_dir=(-1, 0, 0), z_dir=(0, 0, -1))):
        with Locations((-46.84572901, 41.350914957)):
            Rectangle(SKETCH_24_W, SKETCH_24_H)
        with Locations((47.53599277, 41.350914957)):
            Rectangle(SKETCH_24_W_2, SKETCH_24_H)
    extrude(amount=-EXTRUDE_5_DEPTH)

    # 草图25 → 切除-拉伸17 (cut, through all)
    with BuildSketch(Plane(origin=(0, 0, 0), x_dir=(-1, 0, 0), z_dir=(0, 0, -1))):
        with BuildLine():
            Line((-14.658238954, 113.011343001), (-32.658238954, 113.011343001))
            ThreePointArc((-32.658238954, 113.011343001), (-34.408238954, 111.261343001), (-32.658238954, 109.511343001))
            Line((-32.658238954, 109.511343001), (-14.658238954, 109.511343001))
            ThreePointArc((-14.658238954, 109.511343001), (-12.908238954, 111.261343001), (-14.658238954, 113.011343001))
        make_face()
        with BuildLine():
            Line((-20.999999982, 43.011343001), (-32.658238954, 43.011343001))
            ThreePointArc((-32.658238954, 43.011343001), (-34.408238954, 41.261343001), (-32.658238954, 39.511343001))
            Line((-32.658238954, 39.511343001), (-21, 39.511343001))
            ThreePointArc((-21, 39.511343001), (-22.75, 41.26134301), (-20.999999982, 43.011343001))
        make_face()
        with BuildLine():
            ThreePointArc((14.341761046, 113.011343001), (12.591761046, 111.261343001), (14.341761046, 109.511343001))
            Line((14.341761046, 109.511343001), (32.341761046, 109.511343001))
            ThreePointArc((32.341761046, 109.511343001), (34.091761046, 111.261343001), (32.341761046, 113.011343001))
            Line((32.341761046, 113.011343001), (14.341761046, 113.011343001))
        make_face()
        with BuildLine():
            Line((-14.658238954, 43.011343001), (-20.999999982, 43.011343001))
            ThreePointArc((-20.999999982, 43.011343001), (-19.25, 41.261342991), (-21, 39.511343001))
            Line((-21, 39.511343001), (-14.658238954, 39.511343001))
            ThreePointArc((-14.658238954, 39.511343001), (-12.908238954, 41.261343001), (-14.658238954, 43.011343001))
        make_face()
        with BuildLine():
            ThreePointArc((32.341761046, 39.511343001), (34.091761046, 41.261343001), (32.341761046, 43.011343001))
            Line((32.341761046, 43.011343001), (21, 43.011343001))
            ThreePointArc((21, 43.011343001), (22.75, 41.261343001), (21, 39.511343001))
            Line((21, 39.511343001), (32.341761046, 39.511343001))
        make_face()
        with BuildLine():
            ThreePointArc((14.341761046, 43.011343001), (12.591761046, 41.261343001), (14.341761046, 39.511343001))
            Line((14.341761046, 39.511343001), (21, 39.511343001))
            ThreePointArc((21, 39.511343001), (19.25, 41.261343001), (21, 43.011343001))
            Line((21, 43.011343001), (14.341761046, 43.011343001))
        make_face()
    extrude(amount=-CUT_EXTRUDE_17_DEPTH, mode=Mode.SUBTRACT)

    # 草图16 → 切除-拉伸19 (cut, through all)
    with BuildSketch(Plane(origin=(0, 0, 0), x_dir=(-1, 0, 0), z_dir=(0, 0, -1))):
        with BuildLine():
            Line((-62, 43.011343001), (-32, 43.011343001))
            ThreePointArc((-32, 43.011343001), (-30.25, 41.261343001), (-32, 39.511343001))
            Line((-32, 39.511343001), (-62, 39.511343001))
            ThreePointArc((-62, 39.511343001), (-63.75, 41.261343001), (-62, 43.011343001))
        make_face()
        with BuildLine():
            Line((62, 39.511343001), (32, 39.511343001))
            ThreePointArc((32, 39.511343001), (30.25, 41.261343001), (32, 43.011343001))
            Line((32, 43.011343001), (62, 43.011343001))
            ThreePointArc((62, 43.011343001), (63.75, 41.261343001), (62, 39.511343001))
        make_face()
    extrude(amount=-CUT_EXTRUDE_19_DEPTH, mode=Mode.SUBTRACT)

    # 草图26 → 切除-拉伸20 (cut, through all)
    with BuildSketch(Plane(origin=(0, 0, 0), x_dir=(-1, 0, 0), z_dir=(0, 0, -1))):
        with BuildLine():
            Line((15, 71.876956146), (-15, 71.876956146))
            ThreePointArc((-15, 71.876956146), (-20, 76.876956146), (-15, 81.876956146))
            Line((-15, 81.876956146), (15, 81.876956146))
            ThreePointArc((15, 81.876956146), (20, 76.876956146), (15, 71.876956146))
        make_face()
    extrude(amount=-CUT_EXTRUDE_20_DEPTH, mode=Mode.SUBTRACT)

    # 草图27 → 切除-拉伸21 (cut, through all)
    with BuildSketch(Plane(origin=(0, 0, 0), x_dir=(-1, 0, 0), z_dir=(0, 0, -1))):
        with BuildLine():
            Line((-10, -15.809971609), (-42.5, -15.809971609))
            ThreePointArc((-42.5, -15.809971609), (-44.25, -17.559971609), (-42.5, -19.309971609))
            Line((-42.5, -19.309971609), (-10, -19.309971609))
            ThreePointArc((-10, -19.309971609), (-8.25, -17.559971609), (-10, -15.809971609))
        make_face()
        with BuildLine():
            ThreePointArc((-42.5, 7.190028391), (-44.25, 5.440028391), (-42.5, 3.690028391))
            Line((-42.5, 3.690028391), (-10, 3.690028391))
            ThreePointArc((-10, 3.690028391), (-8.25, 5.440028391), (-10, 7.190028391))
            Line((-10, 7.190028391), (-42.5, 7.190028391))
        make_face()
        with BuildLine():
            Line((42.5, -15.809971609), (10, -15.809971609))
            ThreePointArc((10, -15.809971609), (8.25, -17.559971609), (10, -19.309971609))
            Line((10, -19.309971609), (42.5, -19.309971609))
            ThreePointArc((42.5, -19.309971609), (44.25, -17.559971609), (42.5, -15.809971609))
        make_face()
        with BuildLine():
            Line((42.5, 7.190028391), (10, 7.190028391))
            ThreePointArc((10, 7.190028391), (8.25, 5.440028391), (10, 3.690028391))
            Line((10, 3.690028391), (42.5, 3.690028391))
            ThreePointArc((42.5, 3.690028391), (44.25, 5.440028391), (42.5, 7.190028391))
        make_face()
    extrude(amount=-CUT_EXTRUDE_21_DEPTH, mode=Mode.SUBTRACT)

    # 草图28 → 切除-拉伸22 (cut, through all)
    with BuildSketch(Plane(origin=(0, 0, 0), x_dir=(-1, 0, 0), z_dir=(0, 0, -1))):
        with BuildLine():
            ThreePointArc((0, -48.812330529), (-7.86916468, -46.39674179), (-10.284753419, -54.26590647))
            ThreePointArc((-10.284753419, -54.26590647), (-5.977554294, -59.915955393), (0, -63.755729058))
            ThreePointArc((0, -63.755729058), (5.977554294, -59.915955393), (10.284753419, -54.26590647))
            ThreePointArc((10.284753419, -54.26590647), (7.86916468, -46.39674179), (0, -48.812330529))
        make_face()
    extrude(amount=-CUT_EXTRUDE_22_DEPTH, mode=Mode.SUBTRACT)

    # 草图29 → 切除-拉伸23 (cut)
    with BuildSketch(Plane(origin=(0, 0, 0), x_dir=(-1, 0, 0), z_dir=(0, 0, -1))):
        with BuildLine():
            ThreePointArc((-21.368709037, -73.490793052), (0, -84.713248851), (21.368709037, -73.490793052))
            ThreePointArc((21.368709037, -73.490793052), (23.760053677, -73.051240341), (24.199606389, -75.442584981))
            ThreePointArc((24.199606389, -75.442584981), (0, -88.151776376), (-24.199606389, -75.442584981))
            ThreePointArc((-24.199606389, -75.442584981), (-23.760053677, -73.051240341), (-21.368709037, -73.490793052))
        make_face()
    extrude(amount=-CUT_EXTRUDE_23_DEPTH, mode=Mode.SUBTRACT)


with BuildPart() as body_2:
    # 草图30 → 凸台-拉伸6 (new body)
    with BuildSketch(Plane(origin=(0, 0, -10), x_dir=(-1, 0, 0), z_dir=(0, 0, -1))):
        with BuildLine():
            Line((-12, 106.371786435), (-12, 141.664519159))
            Line((-12, 141.664519159), (12, 141.664519159))
            Line((12, 141.664519159), (12, 106.371786435))
            ThreePointArc((12, 106.371786435), (0, 94.371786435), (-12, 106.371786435))
        make_face()
        with Locations((8, 106.371786435)):
            Circle(SKETCH_30_R, mode=Mode.SUBTRACT)
        with Locations((0, 98.371786435)):
            Circle(SKETCH_30_R, mode=Mode.SUBTRACT)
        with Locations((-8, 106.371786435)):
            Circle(SKETCH_30_R, mode=Mode.SUBTRACT)
        with Locations((0, 114.371786435)):
            Circle(SKETCH_30_R, mode=Mode.SUBTRACT)
        with Locations((0, 106.371786435)):
            Circle(SKETCH_30_R_2, mode=Mode.SUBTRACT)
    extrude(amount=EXTRUDE_6_DEPTH)

    # 草图31 → 凸台-拉伸7 (add)
    with BuildSketch(Plane.ZY.offset(12)):
        Polygon((-10, 121.664519159), (15, 129.664519159), (18, 130.624519159), (18, 139.364328678), (15, 139.364328678), (15, 133.864328678), (-10, 125.864328678), align=None)
    extrude(amount=-EXTRUDE_7_DEPTH)

    # 草图32 → 切除-拉伸26 (cut)
    with BuildSketch(Plane.ZY.offset(12)):
        Polygon((-14, 124.584328678), (-10, 125.864328678), (-10, 141.664519159), (-14, 141.664519159), align=None)
    extrude(amount=-CUT_EXTRUDE_26_DEPTH, mode=Mode.SUBTRACT)

    # 草图34 → 凸台-拉伸8 (add)
    with BuildSketch(Plane(origin=(0, 139.364328678, 0), x_dir=(1, 0, 0), z_dir=(0, 1, 0))):
        Polygon((-12, -6), (-7, -18), (7, -18), (12, -6), (12, 14), (-12, 14), align=None)
    extrude(amount=EXTRUDE_8_DEPTH)

    # 草图36 → 凸台-拉伸9 (add)
    with BuildSketch(Plane(origin=(0, 137.364328678, 0), x_dir=(-1, 0, 0), z_dir=(0, -1, 0))):
        Polygon((-12, -6), (-8.25, -15), (8.25, -15), (12, -6), (12, 14), (-12, 14), align=None)
    extrude(amount=-EXTRUDE_9_DEPTH)

    # 草图37 → 切除-拉伸27 (cut)
    with BuildSketch(Plane(origin=(0, 149.364328678, 0), x_dir=(1, 0, 0), z_dir=(0, 1, 0))):
        Polygon((-12, 14), (-12, -6), (-7, -18), (7, -18), (12, -6), (12, 14), align=None)
    extrude(amount=-CUT_EXTRUDE_27_DEPTH, mode=Mode.SUBTRACT)

    # 草图38 → 切除-拉伸28 (cut, through all)
    with BuildSketch(Plane.ZY.offset(12)):
        with Locations((16.5, 138.864328678)):
            Rectangle(SKETCH_38_W, SKETCH_38_H)
    extrude(amount=-CUT_EXTRUDE_28_DEPTH, mode=Mode.SUBTRACT)

    # 草图39 → 切除-拉伸29 (cut)
    with BuildSketch(Plane(origin=(0, 138.364328678, 0), x_dir=(1, 0, 0), z_dir=(0, 1, 0))):
        Polygon((12, -6), (8.25, -15), (7, -18), (12, -18), align=None)
        Polygon((-8.25, -15), (-12, -6), (-12, -18), (-7, -18), align=None)
    extrude(amount=-CUT_EXTRUDE_29_DEPTH, mode=Mode.SUBTRACT)

    # 草图41 → 凸台-拉伸11 (add)
    with BuildSketch(Plane(origin=(0, 138.364328678, 0), x_dir=(1, 0, 0), z_dir=(0, 1, 0))):
        Polygon((-7, -18), (7, -18), (12, -6), (12, 14), (-12, 14), (-12, -6), align=None)
    extrude(amount=EXTRUDE_11_DEPTH)

    # 草图42 → 切除-拉伸30 (cut)
    with BuildSketch(Plane(origin=(0, 145.364328678, 0), x_dir=(1, 0, 0), z_dir=(0, 1, 0))):
        Polygon((-9.2, 14), (-9.2, 11.2), (-9.2, -5.44), (-5.133333333, -15.2), (-5.133333333, -18), (5.133333333, -18), (5.133333333, -15.2), (9.2, -5.44), (9.2, 11.2), (9.2, 14), align=None)
    extrude(amount=-CUT_EXTRUDE_30_DEPTH, mode=Mode.SUBTRACT)

    # 草图43 → 凸台-拉伸12 (add)
    with BuildSketch(Plane.ZY.offset(8.25)):
        Polygon((15, 137.364328678), (-14, 137.364328678), (-14, 124.584328678), (15, 133.864328678), align=None)
    extrude_12 = extrude(amount=-EXTRUDE_12_DEPTH)

    # 镜向1: 凸台-拉伸12 across plane
    add(extrude_12.mirror(Plane(origin=(0, 0, 0), x_dir=(0, 0, 1), z_dir=(1, 0, 0))))

    # 草图44 → 切除-拉伸31 (cut)
    with BuildSketch(Plane.ZY.offset(8.25)):
        Polygon((-11, 134.364328678), (6.719196439, 134.364328678), (-11, 128.694185818), align=None)
    extrude(amount=-CUT_EXTRUDE_31_DEPTH, mode=Mode.SUBTRACT)

    # 圆角4
    fillet_4_edges = [body_2.edges().sort_by_distance(p)[0] for p in [
        (-6.75, 134.364328678, 6.719196439),
        (6.75, 134.364328678, 6.719196439),
    ]]
    fillet(fillet_4_edges, radius=FILLET_4_R)

    # 圆角5
    fillet_5_edges = [body_2.edges().sort_by_distance(p)[0] for p in [
        (-6.75, 128.694185818, -11),
        (6.75, 128.694185818, -11),
    ]]
    fillet(fillet_5_edges, radius=FILLET_5_R)

    # 圆角6
    fillet_6_edges = [body_2.edges().sort_by_distance(p)[0] for p in [
        (-6.75, 134.364328678, -11),
        (6.75, 134.364328678, -11),
    ]]
    fillet(fillet_6_edges, radius=FILLET_6_R)

    # 草图45 → 切除-拉伸32 (cut)
    with BuildSketch(Plane(origin=(0, 139.864328678, 0), x_dir=(1, 0, 0), z_dir=(0, 1, 0))):
        with BuildLine():
            Line((3, -6), (3, 6))
            ThreePointArc((3, 6), (0, 9), (-3, 6))
            Line((-3, 6), (-3, -6))
            ThreePointArc((-3, -6), (0, -9), (3, -6))
        make_face()
    extrude(amount=-CUT_EXTRUDE_32_DEPTH, mode=Mode.SUBTRACT)

    # 草图47 → 切除-拉伸33 (cut, through all)
    with BuildSketch(Plane(origin=(0, 0, -14), x_dir=(-1, 0, 0), z_dir=(0, 0, -1))):
        with Locations((0, 144.864328678)):
            Rectangle(SKETCH_47_W, SKETCH_47_H)
    extrude(amount=-CUT_EXTRUDE_33_DEPTH, mode=Mode.SUBTRACT)

    # 草图48 → 凸台-拉伸13 (add)
    # profile 1 of 2: a face of its own
    with BuildSketch(Plane(origin=(0, 144.364328678, 0), x_dir=(1, 0, 0), z_dir=(0, 1, 0))):
        with Locations((-15, 0)):
            Rectangle(SKETCH_48_W, SKETCH_48_H)
        with Locations(Location((-15, 0, 0), (0, 0, 270))):
            Circle(SKETCH_48_R, mode=Mode.SUBTRACT)
    # profile 2 of 2: a face of its own
    with BuildSketch(Plane(origin=(0, 144.364328678, 0), x_dir=(1, 0, 0), z_dir=(0, 1, 0))):
        with Locations((15, 0)):
            Rectangle(SKETCH_48_W, SKETCH_48_H)
        with Locations(Location((15, 0, 0), (0, 0, 90))):
            Circle(SKETCH_48_R, mode=Mode.SUBTRACT)
    extrude(amount=-EXTRUDE_13_DEPTH)

    # 圆角7
    fillet_7_edges = [body_2.edges().sort_by_distance(p)[0] for p in [
        (-18, 142.864328678, 3.5),
        (-18, 142.864328678, -3.5),
        (-12, 142.864328678, -3.5),
        (-12, 142.864328678, 3.5),
        (18, 142.864328678, 3.5),
        (12, 142.864328678, 3.5),
        (12, 142.864328678, -3.5),
        (18, 142.864328678, -3.5),
    ]]
    fillet(fillet_7_edges, radius=FILLET_7_R)


with BuildPart() as body_3:
    # 镜向2: mirrored copy
    add(body_2.part.mirror(Plane.ZX.offset(148.364328678)))

    # 草图49 → 切除-拉伸34 (cut)
    with BuildSketch(Plane.ZY.offset(12)):
        with Locations((6.259442997, 182.307179246)):
            Rectangle(SKETCH_49_W, SKETCH_49_H)
    extrude(amount=-CUT_EXTRUDE_34_DEPTH, mode=Mode.SUBTRACT)

    # 圆角8
    fillet_8_edges = [body_3.edges().sort_by_distance(p)[0] for p in [
        (-12, 155.864328678, -14),
        (12, 155.864328678, -14),
        (7, 155.864328678, 18),
        (-7, 155.864328678, 18),
    ]]
    fillet(fillet_8_edges, radius=FILLET_8_R)

    # 圆角12
    fillet_12_edges = [body_3.edges().sort_by_distance(p)[0] for p in [
        (0, 156.864328678, 18),
    ]]
    fillet(fillet_12_edges, radius=FILLET_12_R)


with BuildPart() as body_2_1:
    add(body_2.part)

    # 圆角9
    fillet_9_edges = [body_2_1.edges().sort_by_distance(p)[0] for p in [
        (7, 137.494423918, 18),
        (-7, 137.494423918, 18),
    ]]
    fillet(fillet_9_edges, radius=FILLET_9_R)

    # 圆角10
    fillet_10_edges = [body_2_1.edges().sort_by_distance(p)[0] for p in [
        (-12, 140.864328678, -14),
        (12, 140.864328678, -14),
    ]]
    fillet(fillet_10_edges, radius=FILLET_10_R)

    # 圆角11
    fillet_11_edges = [body_2_1.edges().sort_by_distance(p)[0] for p in [
        (-10.125, 124.584328678, -14),
        (0, 124.584328678, -14),
        (10.125, 124.584328678, -14),
    ]]
    fillet(fillet_11_edges, radius=FILLET_11_R)

    # 圆角13
    fillet_13_edges = [body_2_1.edges().sort_by_distance(p)[0] for p in [
        (0, 139.864328678, 18),
    ]]
    fillet(fillet_13_edges, radius=FILLET_13_R)

    # 草图51 → 切除-拉伸36 (cut)
    with BuildSketch(Plane(origin=(0, 0, -14), x_dir=(-1, 0, 0), z_dir=(0, 0, -1))):
        with Locations((0.40334365, 119.025264365)):
            Rectangle(SKETCH_51_W, SKETCH_51_H)
    extrude(amount=-CUT_EXTRUDE_36_DEPTH, mode=Mode.SUBTRACT)


solid = body_3.part
